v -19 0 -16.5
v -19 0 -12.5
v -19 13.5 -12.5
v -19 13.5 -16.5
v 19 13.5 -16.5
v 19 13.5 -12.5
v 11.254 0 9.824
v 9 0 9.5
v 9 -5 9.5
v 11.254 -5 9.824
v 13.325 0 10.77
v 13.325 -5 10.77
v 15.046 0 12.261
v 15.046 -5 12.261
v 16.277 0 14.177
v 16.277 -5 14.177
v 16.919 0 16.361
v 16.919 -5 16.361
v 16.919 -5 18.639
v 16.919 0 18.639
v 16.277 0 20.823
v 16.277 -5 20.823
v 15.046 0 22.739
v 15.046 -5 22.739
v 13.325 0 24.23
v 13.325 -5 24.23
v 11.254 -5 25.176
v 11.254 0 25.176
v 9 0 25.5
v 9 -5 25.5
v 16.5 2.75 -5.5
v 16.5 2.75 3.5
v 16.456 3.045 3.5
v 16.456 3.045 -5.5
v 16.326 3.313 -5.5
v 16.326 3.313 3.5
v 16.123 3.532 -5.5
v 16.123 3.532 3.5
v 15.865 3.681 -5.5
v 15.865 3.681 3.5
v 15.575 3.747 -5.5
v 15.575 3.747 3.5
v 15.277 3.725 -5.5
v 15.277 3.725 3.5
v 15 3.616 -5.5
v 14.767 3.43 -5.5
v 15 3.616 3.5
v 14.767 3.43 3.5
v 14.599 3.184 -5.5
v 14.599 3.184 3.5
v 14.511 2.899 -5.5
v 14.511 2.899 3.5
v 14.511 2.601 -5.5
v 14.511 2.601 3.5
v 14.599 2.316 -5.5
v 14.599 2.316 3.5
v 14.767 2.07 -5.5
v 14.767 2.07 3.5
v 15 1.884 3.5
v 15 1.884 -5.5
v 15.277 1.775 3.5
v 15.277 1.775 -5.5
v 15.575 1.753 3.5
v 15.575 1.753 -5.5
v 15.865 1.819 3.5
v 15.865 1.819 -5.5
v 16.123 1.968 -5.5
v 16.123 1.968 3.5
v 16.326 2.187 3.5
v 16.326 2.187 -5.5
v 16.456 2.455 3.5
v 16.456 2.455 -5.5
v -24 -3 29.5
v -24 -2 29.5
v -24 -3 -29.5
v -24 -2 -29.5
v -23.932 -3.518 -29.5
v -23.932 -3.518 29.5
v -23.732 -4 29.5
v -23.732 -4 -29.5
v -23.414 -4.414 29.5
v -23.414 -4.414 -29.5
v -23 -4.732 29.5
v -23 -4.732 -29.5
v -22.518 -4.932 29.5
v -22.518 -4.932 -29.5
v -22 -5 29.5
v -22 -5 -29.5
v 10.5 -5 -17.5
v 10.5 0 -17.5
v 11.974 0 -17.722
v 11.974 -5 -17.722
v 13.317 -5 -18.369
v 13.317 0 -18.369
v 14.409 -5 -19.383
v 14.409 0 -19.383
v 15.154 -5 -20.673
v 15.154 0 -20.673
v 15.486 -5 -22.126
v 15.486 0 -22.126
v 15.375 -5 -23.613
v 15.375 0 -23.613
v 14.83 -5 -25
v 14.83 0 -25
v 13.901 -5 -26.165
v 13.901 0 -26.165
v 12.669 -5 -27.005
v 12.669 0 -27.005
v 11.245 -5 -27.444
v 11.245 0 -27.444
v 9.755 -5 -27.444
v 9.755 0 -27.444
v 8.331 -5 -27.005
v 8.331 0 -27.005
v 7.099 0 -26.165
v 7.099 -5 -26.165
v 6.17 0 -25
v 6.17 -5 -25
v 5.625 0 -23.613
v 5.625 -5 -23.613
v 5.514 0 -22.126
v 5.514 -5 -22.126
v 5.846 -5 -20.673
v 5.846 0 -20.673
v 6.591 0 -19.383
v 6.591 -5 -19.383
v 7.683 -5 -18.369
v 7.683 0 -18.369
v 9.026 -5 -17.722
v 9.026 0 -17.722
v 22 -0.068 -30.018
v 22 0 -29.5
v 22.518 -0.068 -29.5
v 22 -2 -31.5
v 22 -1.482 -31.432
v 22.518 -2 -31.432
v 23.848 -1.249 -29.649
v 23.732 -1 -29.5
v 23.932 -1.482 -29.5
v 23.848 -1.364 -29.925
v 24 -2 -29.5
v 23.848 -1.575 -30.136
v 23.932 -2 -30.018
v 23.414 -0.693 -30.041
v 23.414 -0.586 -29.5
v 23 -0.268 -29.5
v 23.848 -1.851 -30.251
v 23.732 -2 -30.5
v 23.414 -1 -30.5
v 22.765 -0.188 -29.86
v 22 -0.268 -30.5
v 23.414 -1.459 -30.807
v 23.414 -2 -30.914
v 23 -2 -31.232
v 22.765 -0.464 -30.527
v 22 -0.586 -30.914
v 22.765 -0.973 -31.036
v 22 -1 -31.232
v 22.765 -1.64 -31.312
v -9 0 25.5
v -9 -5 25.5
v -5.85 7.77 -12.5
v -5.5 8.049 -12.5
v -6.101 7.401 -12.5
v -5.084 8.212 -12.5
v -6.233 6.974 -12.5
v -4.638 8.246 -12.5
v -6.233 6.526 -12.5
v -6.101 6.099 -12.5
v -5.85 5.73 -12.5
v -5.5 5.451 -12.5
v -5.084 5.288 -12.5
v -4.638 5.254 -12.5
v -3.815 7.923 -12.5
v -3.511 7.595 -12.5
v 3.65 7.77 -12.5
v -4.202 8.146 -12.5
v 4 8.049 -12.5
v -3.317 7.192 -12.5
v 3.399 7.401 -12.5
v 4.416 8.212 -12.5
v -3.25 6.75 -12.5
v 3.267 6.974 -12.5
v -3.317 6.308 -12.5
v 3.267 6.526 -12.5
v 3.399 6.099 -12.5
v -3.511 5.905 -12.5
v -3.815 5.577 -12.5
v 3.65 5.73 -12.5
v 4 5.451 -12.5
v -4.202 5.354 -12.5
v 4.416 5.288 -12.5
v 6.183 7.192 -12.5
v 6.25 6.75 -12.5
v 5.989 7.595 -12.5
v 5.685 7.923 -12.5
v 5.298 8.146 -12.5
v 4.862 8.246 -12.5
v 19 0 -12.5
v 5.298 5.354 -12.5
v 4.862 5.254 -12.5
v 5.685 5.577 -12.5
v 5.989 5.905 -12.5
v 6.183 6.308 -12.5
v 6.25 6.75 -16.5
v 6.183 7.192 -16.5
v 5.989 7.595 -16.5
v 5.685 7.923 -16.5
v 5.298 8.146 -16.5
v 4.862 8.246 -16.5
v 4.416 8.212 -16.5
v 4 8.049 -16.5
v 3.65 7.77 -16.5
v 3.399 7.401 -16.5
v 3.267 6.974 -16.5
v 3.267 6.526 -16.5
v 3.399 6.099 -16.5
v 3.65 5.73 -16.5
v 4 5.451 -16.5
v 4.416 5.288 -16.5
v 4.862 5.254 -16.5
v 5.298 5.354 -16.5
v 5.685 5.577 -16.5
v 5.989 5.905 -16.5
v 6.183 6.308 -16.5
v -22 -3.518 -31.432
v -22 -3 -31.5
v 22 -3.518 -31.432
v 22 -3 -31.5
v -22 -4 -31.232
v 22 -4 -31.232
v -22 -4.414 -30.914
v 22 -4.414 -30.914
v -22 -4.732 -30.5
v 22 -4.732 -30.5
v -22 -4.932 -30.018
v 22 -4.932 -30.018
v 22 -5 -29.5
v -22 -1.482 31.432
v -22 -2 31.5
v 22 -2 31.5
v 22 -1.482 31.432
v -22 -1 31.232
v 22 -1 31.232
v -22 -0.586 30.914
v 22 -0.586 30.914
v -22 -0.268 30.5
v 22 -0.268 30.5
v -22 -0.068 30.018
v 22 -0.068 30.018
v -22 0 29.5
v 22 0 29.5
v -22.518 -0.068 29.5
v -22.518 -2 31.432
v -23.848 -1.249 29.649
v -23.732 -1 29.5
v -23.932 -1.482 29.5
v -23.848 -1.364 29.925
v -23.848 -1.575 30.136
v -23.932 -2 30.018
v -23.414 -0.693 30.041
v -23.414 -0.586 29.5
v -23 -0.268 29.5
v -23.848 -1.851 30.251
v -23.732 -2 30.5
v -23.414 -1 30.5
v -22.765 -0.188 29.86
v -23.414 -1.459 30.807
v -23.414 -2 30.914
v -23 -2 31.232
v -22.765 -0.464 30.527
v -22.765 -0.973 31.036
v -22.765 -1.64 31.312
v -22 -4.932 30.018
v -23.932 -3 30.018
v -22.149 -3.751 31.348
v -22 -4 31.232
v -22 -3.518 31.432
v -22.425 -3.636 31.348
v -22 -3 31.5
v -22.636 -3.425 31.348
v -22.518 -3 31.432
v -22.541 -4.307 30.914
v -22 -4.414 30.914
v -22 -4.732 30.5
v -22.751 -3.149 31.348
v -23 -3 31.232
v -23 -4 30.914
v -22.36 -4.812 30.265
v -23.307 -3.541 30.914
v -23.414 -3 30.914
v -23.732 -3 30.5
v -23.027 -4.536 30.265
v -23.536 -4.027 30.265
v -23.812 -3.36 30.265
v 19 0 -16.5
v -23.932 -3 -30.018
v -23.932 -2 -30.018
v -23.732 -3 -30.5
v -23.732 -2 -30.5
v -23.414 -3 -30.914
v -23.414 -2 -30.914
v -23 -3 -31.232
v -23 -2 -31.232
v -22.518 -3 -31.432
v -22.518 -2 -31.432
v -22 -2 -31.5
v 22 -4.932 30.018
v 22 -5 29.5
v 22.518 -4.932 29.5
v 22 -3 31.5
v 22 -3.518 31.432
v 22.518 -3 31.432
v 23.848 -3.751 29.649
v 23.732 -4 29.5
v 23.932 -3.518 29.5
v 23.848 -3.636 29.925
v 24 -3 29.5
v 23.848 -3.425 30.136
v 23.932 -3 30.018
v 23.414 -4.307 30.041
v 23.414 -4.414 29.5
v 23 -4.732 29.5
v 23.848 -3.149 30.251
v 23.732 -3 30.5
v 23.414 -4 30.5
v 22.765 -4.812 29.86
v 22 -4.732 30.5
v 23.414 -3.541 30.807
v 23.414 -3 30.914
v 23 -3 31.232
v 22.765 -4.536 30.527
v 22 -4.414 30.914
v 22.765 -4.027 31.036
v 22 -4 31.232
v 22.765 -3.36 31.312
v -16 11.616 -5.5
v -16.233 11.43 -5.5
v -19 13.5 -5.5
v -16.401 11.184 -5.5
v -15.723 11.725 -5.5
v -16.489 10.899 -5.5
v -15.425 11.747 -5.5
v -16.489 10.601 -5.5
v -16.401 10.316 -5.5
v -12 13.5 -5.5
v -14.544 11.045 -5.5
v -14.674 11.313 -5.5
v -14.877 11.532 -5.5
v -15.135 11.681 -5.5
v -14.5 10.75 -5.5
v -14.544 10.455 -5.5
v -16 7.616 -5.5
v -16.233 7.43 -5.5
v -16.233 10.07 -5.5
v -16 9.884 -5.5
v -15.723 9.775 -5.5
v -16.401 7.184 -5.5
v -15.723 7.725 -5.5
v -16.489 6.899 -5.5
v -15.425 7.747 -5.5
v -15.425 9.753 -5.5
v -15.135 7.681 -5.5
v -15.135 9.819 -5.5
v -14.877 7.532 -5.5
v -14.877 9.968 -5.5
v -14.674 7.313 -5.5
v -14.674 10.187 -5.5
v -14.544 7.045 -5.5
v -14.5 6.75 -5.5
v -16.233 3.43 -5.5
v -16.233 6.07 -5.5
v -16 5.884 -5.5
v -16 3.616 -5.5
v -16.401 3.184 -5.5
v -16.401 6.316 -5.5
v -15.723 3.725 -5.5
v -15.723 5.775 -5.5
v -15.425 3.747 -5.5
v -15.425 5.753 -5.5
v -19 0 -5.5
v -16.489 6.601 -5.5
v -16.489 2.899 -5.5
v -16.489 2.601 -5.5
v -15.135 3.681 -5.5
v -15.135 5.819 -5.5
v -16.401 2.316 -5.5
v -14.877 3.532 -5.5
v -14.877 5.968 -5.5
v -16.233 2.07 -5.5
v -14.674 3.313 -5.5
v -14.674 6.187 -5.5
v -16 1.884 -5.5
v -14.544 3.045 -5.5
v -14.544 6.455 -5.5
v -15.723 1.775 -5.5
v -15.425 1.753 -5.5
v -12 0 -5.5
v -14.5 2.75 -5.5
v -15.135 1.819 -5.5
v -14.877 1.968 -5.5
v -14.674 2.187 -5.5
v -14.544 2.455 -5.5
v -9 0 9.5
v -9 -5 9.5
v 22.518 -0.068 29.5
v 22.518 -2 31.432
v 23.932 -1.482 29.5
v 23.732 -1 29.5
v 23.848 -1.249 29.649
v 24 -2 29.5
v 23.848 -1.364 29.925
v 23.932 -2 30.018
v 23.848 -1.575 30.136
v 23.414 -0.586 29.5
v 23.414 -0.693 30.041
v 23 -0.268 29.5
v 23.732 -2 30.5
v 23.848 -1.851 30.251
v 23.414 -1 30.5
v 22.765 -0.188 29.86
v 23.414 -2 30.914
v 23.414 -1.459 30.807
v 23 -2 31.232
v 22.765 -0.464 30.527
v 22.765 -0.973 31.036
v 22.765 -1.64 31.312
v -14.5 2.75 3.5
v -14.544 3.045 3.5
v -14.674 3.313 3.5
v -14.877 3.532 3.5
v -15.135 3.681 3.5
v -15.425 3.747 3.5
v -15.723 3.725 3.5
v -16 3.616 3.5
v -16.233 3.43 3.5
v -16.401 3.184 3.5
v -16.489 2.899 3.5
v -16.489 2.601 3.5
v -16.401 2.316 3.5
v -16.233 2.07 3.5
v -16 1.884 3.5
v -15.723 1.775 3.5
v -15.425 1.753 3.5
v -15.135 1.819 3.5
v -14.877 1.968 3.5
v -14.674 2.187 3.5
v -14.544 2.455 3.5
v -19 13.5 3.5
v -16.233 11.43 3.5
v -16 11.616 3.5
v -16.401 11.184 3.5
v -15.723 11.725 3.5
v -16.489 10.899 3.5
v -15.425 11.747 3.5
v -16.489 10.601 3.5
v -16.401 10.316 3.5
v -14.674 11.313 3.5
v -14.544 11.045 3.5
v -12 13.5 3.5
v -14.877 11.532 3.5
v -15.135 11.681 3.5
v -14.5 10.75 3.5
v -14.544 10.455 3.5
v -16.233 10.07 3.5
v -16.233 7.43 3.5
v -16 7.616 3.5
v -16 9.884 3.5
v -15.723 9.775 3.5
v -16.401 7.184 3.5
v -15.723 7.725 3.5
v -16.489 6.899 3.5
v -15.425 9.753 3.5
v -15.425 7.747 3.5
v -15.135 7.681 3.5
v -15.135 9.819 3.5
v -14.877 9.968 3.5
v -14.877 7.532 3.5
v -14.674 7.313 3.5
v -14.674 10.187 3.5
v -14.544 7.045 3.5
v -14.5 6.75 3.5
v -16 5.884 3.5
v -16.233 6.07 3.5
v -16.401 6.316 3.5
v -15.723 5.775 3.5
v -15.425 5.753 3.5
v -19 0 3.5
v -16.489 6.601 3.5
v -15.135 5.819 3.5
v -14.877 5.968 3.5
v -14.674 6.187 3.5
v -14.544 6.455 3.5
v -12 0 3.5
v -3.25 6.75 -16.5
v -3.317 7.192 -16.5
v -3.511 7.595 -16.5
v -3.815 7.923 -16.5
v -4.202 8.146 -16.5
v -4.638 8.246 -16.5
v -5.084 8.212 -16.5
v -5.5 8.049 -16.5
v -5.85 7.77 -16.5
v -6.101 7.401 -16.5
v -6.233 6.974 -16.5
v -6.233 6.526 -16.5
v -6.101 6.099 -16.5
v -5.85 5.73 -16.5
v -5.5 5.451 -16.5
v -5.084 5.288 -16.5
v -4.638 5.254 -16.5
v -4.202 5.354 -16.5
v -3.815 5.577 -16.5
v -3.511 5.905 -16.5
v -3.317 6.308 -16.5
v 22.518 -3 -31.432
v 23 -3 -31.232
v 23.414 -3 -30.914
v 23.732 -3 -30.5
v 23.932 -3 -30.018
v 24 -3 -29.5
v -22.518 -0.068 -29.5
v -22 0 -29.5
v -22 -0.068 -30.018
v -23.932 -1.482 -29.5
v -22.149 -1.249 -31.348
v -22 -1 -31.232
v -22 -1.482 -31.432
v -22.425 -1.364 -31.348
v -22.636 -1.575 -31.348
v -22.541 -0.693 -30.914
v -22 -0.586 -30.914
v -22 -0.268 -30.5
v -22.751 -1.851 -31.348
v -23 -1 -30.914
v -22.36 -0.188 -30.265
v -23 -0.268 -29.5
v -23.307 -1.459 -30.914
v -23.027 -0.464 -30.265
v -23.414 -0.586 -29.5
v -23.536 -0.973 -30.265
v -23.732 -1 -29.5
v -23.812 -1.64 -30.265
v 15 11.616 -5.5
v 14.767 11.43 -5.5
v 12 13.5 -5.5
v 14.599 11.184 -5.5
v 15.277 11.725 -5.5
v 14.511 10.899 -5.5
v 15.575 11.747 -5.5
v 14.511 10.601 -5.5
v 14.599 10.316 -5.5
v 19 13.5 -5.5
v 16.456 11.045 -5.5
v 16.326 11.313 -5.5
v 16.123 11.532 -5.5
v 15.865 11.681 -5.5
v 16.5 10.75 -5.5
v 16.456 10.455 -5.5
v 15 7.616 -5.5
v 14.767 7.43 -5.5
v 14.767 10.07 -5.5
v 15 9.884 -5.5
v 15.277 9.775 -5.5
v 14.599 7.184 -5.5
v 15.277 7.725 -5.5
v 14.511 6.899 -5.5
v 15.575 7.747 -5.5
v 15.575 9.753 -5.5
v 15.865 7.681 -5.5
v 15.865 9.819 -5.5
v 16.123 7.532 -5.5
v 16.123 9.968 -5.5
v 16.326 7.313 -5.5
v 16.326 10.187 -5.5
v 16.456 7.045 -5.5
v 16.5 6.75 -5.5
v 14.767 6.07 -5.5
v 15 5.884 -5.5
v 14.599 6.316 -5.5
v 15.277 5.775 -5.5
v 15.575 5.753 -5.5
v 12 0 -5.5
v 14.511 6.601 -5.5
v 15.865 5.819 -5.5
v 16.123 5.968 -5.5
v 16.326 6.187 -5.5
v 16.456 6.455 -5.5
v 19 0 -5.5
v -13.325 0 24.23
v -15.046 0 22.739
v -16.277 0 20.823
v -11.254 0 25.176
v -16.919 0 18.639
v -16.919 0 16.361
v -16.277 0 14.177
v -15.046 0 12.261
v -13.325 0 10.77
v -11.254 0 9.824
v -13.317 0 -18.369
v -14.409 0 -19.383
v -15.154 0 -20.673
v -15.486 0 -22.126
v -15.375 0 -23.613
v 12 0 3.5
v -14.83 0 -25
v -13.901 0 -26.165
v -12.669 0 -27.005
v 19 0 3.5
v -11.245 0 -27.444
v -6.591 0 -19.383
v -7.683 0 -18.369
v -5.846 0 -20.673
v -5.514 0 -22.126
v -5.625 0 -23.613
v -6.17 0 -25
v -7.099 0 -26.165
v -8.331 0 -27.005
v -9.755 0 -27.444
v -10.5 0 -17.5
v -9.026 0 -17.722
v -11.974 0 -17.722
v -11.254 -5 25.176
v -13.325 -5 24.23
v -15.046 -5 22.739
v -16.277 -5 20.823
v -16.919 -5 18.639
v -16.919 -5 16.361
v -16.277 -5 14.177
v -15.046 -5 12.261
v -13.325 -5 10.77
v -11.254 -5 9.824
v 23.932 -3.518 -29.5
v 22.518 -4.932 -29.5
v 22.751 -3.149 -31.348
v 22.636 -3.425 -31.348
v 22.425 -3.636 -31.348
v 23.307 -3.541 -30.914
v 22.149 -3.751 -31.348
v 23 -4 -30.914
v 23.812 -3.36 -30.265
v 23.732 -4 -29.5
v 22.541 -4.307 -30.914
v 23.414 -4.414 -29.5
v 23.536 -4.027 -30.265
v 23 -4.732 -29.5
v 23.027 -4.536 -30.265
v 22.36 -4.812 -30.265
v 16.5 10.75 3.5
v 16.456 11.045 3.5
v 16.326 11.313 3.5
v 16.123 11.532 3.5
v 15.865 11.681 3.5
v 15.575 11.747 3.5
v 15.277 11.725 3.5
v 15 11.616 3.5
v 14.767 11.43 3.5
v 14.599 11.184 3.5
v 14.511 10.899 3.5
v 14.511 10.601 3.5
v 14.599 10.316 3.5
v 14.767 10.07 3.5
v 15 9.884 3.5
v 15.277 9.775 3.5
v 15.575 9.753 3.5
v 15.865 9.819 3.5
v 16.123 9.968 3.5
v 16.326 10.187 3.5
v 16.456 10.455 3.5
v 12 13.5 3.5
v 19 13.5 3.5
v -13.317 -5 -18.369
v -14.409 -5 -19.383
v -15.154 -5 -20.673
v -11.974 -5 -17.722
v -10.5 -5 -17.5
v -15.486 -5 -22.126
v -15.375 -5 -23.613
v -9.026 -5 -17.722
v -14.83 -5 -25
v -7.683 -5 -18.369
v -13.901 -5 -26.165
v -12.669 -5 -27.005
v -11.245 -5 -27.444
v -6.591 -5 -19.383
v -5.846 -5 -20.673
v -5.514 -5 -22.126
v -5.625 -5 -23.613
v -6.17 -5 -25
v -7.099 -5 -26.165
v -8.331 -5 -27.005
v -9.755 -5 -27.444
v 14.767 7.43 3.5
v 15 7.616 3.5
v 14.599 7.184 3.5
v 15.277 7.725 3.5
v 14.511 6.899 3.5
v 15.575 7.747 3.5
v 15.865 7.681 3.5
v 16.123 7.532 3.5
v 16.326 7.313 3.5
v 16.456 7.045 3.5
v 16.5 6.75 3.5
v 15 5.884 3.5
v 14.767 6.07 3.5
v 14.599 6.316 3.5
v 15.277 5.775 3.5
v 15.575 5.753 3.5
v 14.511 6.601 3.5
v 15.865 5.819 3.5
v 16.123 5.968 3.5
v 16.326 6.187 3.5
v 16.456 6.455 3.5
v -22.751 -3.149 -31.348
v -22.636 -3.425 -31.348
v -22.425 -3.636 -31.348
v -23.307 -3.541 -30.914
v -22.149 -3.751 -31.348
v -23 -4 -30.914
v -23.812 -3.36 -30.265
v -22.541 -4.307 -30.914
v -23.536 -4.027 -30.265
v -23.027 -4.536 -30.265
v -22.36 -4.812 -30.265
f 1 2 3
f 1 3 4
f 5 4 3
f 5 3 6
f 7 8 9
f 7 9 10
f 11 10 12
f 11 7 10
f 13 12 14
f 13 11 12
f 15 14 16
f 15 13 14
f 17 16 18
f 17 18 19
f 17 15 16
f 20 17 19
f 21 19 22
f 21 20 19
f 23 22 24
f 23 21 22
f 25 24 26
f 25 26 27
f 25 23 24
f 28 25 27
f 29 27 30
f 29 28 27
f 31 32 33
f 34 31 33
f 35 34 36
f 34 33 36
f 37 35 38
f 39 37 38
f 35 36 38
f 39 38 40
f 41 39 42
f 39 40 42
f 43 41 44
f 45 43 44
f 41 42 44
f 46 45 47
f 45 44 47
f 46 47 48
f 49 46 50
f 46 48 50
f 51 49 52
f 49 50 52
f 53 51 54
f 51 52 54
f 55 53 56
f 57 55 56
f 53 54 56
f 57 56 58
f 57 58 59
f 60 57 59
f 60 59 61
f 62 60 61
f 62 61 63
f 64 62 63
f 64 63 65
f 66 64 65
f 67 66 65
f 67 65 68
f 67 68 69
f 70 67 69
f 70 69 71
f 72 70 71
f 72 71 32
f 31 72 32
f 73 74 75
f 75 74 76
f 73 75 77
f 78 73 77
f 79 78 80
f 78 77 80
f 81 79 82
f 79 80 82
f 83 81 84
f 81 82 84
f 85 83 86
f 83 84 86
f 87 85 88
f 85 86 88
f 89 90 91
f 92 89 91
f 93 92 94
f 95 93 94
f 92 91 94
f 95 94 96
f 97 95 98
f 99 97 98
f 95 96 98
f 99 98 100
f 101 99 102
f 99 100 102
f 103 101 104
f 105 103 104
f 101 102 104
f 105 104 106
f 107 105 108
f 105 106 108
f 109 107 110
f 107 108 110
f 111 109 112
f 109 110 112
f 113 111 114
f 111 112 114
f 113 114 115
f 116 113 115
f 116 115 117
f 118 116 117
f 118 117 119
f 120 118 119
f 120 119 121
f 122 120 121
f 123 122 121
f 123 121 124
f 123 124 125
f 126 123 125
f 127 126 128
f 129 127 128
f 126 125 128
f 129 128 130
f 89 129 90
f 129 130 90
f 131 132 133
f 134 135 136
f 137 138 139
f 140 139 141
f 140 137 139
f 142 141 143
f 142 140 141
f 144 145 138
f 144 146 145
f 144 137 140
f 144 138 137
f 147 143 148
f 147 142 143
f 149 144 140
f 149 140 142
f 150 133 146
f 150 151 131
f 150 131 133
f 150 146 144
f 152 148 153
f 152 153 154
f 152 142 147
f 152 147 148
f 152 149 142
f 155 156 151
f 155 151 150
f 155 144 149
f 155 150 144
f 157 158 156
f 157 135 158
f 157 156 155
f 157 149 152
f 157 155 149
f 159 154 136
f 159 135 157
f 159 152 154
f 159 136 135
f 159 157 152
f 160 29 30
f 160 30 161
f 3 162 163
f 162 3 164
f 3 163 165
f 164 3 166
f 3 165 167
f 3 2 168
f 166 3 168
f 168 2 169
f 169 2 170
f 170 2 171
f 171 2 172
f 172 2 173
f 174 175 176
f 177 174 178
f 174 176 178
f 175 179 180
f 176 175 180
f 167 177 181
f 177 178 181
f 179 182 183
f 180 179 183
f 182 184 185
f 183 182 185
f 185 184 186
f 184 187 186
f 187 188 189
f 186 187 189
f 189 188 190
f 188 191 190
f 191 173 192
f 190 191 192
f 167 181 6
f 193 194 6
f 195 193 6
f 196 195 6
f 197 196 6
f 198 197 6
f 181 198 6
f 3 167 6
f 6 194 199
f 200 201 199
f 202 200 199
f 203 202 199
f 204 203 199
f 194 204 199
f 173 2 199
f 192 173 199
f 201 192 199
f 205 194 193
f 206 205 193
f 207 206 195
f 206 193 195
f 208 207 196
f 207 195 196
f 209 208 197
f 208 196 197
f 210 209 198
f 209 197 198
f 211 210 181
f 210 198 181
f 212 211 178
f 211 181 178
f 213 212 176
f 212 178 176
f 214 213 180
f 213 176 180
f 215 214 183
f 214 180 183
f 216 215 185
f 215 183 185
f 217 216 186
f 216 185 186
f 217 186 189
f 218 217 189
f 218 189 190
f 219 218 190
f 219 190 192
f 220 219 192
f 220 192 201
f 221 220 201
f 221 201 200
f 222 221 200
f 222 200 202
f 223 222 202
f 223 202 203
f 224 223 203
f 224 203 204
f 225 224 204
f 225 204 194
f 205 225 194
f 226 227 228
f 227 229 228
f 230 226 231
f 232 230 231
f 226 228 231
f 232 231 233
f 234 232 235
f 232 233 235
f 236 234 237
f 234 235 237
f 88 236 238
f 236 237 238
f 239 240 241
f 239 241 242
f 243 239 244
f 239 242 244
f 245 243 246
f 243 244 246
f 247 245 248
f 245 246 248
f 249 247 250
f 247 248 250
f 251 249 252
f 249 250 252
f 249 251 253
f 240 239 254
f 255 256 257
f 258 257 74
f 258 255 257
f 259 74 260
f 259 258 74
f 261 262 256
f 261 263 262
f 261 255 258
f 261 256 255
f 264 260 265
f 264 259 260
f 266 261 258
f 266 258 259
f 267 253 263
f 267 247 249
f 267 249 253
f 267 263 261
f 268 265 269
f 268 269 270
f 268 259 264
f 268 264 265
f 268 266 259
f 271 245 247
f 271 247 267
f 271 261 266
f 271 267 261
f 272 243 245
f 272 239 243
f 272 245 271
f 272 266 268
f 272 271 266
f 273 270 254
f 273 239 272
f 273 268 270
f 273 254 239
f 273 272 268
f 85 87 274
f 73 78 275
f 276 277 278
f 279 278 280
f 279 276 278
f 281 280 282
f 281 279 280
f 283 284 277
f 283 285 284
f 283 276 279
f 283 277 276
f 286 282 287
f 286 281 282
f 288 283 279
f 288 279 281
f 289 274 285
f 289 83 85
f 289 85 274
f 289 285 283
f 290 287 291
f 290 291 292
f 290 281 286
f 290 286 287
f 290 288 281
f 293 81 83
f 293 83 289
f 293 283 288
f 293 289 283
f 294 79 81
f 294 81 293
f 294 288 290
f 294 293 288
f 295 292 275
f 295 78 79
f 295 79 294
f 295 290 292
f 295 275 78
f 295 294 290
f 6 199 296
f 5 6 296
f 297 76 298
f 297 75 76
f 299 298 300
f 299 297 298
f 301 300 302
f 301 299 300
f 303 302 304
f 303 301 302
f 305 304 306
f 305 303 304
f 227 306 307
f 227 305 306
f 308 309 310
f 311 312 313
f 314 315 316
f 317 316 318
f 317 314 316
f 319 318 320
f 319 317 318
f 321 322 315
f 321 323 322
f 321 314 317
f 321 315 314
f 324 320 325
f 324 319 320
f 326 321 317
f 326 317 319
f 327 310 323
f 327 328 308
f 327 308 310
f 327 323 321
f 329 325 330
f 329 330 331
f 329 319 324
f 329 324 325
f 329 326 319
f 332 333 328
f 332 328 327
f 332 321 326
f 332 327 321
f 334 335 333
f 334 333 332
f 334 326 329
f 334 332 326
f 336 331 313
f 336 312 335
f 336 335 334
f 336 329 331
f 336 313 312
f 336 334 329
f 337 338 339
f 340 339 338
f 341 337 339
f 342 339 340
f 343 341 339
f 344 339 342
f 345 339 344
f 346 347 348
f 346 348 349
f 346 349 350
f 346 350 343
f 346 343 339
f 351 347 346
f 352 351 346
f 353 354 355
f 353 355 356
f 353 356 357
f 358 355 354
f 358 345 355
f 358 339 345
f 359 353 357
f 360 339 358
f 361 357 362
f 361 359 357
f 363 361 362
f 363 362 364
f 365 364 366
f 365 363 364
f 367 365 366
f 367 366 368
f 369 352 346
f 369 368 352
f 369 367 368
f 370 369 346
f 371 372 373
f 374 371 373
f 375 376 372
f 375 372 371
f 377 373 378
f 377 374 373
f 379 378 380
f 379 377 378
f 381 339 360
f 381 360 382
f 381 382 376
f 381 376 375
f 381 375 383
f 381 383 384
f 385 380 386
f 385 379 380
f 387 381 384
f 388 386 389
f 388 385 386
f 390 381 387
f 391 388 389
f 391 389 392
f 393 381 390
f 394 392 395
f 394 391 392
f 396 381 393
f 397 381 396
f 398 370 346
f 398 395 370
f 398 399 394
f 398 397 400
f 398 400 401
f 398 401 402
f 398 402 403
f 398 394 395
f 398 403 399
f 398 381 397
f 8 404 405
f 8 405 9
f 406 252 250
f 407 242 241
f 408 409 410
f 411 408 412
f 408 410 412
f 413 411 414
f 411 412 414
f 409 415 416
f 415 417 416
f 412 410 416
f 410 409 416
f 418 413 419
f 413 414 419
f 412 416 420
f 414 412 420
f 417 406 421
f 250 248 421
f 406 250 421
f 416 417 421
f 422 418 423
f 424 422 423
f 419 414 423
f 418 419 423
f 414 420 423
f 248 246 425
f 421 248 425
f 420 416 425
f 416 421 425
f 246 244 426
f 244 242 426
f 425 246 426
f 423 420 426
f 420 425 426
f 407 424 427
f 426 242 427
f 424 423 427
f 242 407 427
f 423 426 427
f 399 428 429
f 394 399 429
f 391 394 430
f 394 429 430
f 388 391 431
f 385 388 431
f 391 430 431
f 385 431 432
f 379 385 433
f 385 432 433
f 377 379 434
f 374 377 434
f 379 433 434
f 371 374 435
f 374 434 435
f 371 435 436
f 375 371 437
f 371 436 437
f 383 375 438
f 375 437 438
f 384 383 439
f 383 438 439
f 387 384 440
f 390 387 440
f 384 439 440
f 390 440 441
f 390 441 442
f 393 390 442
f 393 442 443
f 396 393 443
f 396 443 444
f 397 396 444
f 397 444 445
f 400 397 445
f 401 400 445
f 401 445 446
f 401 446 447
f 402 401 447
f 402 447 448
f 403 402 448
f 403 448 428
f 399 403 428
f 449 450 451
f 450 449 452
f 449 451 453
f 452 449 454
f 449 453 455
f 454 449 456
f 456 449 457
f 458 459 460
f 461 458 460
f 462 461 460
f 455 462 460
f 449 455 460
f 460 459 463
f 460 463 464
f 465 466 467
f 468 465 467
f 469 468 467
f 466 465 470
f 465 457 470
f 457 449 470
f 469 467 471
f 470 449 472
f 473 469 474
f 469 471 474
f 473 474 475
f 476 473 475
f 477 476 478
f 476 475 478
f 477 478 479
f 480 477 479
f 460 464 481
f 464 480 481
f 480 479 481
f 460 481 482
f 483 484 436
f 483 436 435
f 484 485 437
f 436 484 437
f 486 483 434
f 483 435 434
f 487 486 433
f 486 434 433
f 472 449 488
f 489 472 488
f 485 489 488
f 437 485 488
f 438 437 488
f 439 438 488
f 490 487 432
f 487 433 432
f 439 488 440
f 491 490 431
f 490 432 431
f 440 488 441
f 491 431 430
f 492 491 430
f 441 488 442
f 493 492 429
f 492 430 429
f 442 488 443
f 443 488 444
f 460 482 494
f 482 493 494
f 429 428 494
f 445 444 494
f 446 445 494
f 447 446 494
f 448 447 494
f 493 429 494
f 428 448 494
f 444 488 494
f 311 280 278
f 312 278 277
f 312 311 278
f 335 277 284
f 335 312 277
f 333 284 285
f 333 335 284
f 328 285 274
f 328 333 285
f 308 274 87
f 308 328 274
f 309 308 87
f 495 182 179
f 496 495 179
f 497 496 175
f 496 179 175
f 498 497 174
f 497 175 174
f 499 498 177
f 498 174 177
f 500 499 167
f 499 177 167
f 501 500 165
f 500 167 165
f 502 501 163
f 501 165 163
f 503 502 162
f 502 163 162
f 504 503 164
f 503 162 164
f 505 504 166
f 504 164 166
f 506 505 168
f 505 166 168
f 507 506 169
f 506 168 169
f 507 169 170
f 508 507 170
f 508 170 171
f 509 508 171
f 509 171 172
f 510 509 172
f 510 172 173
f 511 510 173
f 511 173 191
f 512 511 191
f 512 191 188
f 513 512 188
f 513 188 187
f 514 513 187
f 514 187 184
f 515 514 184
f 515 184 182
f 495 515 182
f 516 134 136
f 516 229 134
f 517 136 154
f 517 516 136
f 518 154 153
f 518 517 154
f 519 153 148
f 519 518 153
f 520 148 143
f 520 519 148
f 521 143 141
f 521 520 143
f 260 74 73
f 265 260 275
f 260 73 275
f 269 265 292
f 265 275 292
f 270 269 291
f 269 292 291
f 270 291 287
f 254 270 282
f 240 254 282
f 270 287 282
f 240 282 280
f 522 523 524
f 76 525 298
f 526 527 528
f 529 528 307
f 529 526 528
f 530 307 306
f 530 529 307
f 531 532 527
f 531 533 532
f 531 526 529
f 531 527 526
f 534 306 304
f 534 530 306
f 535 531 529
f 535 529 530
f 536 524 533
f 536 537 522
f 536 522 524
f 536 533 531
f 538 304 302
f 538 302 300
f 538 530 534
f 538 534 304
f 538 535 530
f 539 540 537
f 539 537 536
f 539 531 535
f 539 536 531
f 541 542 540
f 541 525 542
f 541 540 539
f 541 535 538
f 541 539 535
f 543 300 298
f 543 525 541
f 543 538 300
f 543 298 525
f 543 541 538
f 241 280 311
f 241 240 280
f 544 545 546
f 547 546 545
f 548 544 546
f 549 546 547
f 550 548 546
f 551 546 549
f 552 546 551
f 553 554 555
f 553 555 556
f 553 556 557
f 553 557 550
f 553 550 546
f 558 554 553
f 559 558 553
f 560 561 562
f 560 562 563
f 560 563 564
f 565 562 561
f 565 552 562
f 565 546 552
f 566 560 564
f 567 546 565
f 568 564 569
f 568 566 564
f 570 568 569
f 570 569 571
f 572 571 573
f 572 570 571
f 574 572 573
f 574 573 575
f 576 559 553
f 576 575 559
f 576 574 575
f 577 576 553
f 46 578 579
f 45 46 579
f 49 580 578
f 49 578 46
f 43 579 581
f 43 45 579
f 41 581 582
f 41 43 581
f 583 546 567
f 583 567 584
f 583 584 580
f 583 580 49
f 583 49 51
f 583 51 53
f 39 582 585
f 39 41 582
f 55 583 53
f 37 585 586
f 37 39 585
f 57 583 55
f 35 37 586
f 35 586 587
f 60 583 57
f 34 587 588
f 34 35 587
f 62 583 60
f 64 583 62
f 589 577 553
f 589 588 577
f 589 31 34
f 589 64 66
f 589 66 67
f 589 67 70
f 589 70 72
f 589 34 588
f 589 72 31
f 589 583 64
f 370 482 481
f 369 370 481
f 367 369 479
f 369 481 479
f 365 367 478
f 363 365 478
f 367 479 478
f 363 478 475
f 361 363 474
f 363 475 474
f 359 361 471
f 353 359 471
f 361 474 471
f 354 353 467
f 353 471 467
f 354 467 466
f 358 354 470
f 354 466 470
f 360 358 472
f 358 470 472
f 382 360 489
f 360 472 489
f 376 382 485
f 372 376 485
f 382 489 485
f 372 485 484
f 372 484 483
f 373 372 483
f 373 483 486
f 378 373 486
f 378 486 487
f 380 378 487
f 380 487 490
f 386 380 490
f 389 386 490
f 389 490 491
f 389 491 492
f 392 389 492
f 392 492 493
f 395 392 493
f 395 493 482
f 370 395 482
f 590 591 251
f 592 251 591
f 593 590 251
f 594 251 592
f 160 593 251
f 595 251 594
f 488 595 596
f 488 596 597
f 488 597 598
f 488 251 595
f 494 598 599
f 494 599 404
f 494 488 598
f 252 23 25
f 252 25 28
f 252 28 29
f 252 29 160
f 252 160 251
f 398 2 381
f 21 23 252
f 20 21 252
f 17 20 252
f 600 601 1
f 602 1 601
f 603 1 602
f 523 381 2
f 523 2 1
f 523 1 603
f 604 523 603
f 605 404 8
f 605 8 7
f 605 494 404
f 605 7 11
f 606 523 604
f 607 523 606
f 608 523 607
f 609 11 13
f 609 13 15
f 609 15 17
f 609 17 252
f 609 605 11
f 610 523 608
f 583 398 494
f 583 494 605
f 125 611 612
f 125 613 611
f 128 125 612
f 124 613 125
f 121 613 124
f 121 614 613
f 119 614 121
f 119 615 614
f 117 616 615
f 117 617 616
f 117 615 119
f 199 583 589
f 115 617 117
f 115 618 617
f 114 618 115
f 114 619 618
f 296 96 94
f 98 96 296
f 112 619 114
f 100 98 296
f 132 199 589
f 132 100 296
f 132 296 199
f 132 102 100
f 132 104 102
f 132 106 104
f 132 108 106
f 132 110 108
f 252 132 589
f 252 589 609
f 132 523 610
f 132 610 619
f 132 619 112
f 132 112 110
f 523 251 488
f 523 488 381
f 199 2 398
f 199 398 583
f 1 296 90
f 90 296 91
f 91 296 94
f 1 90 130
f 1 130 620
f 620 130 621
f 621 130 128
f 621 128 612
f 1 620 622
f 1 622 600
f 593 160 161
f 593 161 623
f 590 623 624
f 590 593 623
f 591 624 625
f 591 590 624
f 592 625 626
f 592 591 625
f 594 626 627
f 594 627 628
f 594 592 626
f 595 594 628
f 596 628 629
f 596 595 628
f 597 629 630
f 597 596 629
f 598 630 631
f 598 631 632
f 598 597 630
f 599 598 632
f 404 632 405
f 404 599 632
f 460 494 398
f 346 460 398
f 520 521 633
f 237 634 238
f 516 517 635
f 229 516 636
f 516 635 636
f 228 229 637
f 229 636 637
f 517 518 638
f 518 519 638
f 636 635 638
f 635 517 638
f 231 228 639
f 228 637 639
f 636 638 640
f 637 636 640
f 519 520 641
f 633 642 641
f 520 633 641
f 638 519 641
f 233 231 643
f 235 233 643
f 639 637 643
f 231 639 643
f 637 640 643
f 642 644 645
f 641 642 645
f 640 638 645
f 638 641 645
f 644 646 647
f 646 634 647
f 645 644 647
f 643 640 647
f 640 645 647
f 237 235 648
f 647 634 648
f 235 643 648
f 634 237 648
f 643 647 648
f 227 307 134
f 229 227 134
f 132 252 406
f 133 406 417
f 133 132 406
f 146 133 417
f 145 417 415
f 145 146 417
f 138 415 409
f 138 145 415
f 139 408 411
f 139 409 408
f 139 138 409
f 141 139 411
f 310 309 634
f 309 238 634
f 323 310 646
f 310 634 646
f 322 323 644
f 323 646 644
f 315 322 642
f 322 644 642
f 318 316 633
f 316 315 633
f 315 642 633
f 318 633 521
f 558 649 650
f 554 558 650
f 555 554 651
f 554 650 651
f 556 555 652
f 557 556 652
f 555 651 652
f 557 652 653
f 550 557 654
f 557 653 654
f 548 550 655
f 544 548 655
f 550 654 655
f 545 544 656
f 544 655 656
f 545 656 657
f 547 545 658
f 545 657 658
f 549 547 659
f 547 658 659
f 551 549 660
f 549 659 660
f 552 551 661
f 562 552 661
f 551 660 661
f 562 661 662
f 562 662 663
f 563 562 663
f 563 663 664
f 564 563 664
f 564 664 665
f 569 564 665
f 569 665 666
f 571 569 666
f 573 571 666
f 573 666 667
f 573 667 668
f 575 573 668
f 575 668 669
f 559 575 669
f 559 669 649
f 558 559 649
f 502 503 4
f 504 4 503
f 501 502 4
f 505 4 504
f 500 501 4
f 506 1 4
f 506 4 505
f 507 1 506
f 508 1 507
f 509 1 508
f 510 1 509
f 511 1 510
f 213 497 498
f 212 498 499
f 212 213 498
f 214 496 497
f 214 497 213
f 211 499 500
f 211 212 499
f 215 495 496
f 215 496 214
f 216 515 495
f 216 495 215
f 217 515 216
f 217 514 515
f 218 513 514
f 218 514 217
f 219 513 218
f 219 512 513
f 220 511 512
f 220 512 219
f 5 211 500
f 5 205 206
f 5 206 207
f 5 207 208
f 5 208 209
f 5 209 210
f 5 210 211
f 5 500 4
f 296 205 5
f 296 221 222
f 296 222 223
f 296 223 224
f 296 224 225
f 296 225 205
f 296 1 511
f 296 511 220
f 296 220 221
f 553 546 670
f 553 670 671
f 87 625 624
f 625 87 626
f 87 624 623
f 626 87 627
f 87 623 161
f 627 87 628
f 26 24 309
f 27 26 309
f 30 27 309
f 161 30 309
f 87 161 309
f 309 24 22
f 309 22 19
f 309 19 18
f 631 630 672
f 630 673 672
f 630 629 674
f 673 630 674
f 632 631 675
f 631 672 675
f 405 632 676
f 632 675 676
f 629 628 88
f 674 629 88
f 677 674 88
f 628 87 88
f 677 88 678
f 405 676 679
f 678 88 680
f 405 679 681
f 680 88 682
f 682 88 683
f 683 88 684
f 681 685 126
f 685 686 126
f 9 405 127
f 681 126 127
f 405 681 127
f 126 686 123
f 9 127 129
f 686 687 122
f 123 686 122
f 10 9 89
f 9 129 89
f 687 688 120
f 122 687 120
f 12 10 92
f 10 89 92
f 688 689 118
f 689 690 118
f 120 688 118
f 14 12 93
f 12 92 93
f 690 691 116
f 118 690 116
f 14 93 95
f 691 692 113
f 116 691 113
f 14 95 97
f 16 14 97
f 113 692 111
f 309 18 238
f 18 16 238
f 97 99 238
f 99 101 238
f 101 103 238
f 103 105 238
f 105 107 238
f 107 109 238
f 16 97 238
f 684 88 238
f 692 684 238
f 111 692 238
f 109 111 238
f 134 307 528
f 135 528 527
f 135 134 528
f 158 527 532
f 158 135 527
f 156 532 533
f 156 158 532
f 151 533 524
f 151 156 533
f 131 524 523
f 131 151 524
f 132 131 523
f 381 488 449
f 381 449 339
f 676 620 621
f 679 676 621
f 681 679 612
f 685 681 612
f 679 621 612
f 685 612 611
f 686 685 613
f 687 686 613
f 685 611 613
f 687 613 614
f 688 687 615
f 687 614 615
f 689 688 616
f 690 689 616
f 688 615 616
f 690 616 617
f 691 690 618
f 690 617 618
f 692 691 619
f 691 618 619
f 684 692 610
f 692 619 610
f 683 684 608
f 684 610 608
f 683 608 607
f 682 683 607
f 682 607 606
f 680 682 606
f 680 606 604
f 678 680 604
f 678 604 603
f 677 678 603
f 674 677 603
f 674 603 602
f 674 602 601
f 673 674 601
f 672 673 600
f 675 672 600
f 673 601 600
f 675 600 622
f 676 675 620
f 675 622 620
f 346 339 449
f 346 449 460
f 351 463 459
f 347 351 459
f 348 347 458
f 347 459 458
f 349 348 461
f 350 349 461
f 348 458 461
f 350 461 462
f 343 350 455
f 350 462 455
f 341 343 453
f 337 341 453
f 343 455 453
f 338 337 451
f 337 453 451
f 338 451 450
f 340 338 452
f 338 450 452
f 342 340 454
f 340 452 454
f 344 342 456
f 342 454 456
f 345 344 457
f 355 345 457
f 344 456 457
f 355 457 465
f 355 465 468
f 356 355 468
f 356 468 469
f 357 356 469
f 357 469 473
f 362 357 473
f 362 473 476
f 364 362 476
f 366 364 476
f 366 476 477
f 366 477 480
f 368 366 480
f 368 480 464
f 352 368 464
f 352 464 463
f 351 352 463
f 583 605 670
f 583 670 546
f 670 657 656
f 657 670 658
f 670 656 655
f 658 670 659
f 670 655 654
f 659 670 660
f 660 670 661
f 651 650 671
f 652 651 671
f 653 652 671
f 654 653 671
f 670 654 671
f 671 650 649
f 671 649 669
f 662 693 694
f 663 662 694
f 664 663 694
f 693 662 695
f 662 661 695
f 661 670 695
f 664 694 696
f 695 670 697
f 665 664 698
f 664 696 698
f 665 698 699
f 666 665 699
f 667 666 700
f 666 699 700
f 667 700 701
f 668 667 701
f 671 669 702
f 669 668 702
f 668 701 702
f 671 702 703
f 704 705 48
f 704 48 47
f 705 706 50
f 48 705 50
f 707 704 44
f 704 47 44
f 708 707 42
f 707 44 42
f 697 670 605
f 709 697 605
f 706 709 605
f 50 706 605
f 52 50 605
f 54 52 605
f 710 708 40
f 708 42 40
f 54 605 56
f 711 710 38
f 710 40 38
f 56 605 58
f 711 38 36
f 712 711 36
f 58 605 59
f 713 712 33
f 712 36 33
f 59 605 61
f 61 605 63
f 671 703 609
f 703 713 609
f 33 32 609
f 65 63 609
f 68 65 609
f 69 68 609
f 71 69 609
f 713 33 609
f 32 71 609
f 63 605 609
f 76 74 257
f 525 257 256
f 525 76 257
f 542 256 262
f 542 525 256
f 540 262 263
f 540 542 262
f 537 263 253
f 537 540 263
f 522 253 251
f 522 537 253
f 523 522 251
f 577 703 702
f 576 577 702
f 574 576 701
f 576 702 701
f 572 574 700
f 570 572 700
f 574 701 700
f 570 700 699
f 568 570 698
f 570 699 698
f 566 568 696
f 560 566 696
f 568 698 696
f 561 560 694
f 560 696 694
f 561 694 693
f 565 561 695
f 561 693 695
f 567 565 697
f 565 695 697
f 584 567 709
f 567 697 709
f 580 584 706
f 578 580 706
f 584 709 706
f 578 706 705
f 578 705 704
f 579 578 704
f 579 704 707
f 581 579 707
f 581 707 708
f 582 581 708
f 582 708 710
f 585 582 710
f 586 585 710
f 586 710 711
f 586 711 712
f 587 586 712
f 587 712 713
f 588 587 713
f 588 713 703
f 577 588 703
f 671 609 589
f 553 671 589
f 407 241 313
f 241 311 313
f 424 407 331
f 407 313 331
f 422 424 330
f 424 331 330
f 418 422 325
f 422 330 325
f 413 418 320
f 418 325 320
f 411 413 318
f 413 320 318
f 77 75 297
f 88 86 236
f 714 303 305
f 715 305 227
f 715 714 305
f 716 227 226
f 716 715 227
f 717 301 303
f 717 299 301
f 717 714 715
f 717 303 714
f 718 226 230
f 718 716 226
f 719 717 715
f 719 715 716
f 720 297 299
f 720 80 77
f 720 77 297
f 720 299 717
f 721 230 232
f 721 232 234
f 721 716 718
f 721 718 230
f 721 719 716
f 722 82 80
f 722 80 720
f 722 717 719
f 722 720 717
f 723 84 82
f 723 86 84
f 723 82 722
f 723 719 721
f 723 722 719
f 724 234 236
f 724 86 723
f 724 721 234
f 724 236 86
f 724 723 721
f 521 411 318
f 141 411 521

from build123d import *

# Parameters (mm, degrees)
CROQUIS1_W              = 48
CROQUIS1_H              = 63
CROQUIS1_R              = 5
SALIENTE_EXTRUIR1_DEPTH = 5
CROQUIS2_W              = 7
CROQUIS2_H              = 9
CROQUIS2_W_2            = 38
CROQUIS2_H_2            = 4
SALIENTE_EXTRUIR2_DEPTH = 13.5
CORTAR_EXTRUIR1_REACH   = 53.906
CROQUIS3_R              = 1.5
CORTAR_EXTRUIR2_REACH   = 46.534
CROQUIS4_R              = 1
REDONDEO1_R             = 2


with BuildPart() as part:
    # Croquis1 → Saliente-Extruir1 (new body)
    with BuildSketch(Plane(origin=(0, 0, 0), x_dir=(1, 0, 0), z_dir=(0, 1, 0))):
        Rectangle(CROQUIS1_W, CROQUIS1_H)
        with Locations(Location((-10.5, 22.5, 0), (0, 0, 270))):
            Circle(CROQUIS1_R, mode=Mode.SUBTRACT)
        with Locations(Location((10.5, 22.5, 0), (0, 0, 270))):
            Circle(CROQUIS1_R, mode=Mode.SUBTRACT)
        with BuildLine():
            Line((-9, -9.5), (9, -9.5))
            ThreePointArc((9, -9.5), (17, -17.5), (9, -25.5))
            Line((9, -25.5), (-9, -25.5))
            ThreePointArc((-9, -25.5), (-17, -17.5), (-9, -9.5))
        make_face(mode=Mode.SUBTRACT)
    extrude(amount=-SALIENTE_EXTRUIR1_DEPTH)

    # Croquis2 → Saliente-Extruir2 (add)
    with BuildSketch(Plane(origin=(0, 0, 0), x_dir=(1, 0, 0), z_dir=(0, 1, 0))):
        with Locations((15.5, 1)):
            Rectangle(CROQUIS2_W, CROQUIS2_H)
        with Locations((-15.5, 1)):
            Rectangle(CROQUIS2_W, CROQUIS2_H)
        with Locations((0, 14.5)):
            Rectangle(CROQUIS2_W_2, CROQUIS2_H_2)
    extrude(amount=SALIENTE_EXTRUIR2_DEPTH)

    # Croquis3 → Cortar-Extruir1 (cut, up to next)
    with BuildSketch(Plane.XY.offset(-12.5), mode=Mode.PRIVATE) as cortar_extruir1_sk1:
        with Locations((4.75, 6.75)):
            Circle(CROQUIS3_R)
    cortar_extruir1_tool1 = extrude(cortar_extruir1_sk1.sketch, amount=-CORTAR_EXTRUIR1_REACH, mode=Mode.PRIVATE) & part.part
    # Croquis3 → Cortar-Extruir1 (cut, up to next)
    with BuildSketch(Plane.XY.offset(-12.5), mode=Mode.PRIVATE) as cortar_extruir1_sk2:
        with Locations((-4.75, 6.75)):
            Circle(CROQUIS3_R)
    cortar_extruir1_tool2 = extrude(cortar_extruir1_sk2.sketch, amount=-CORTAR_EXTRUIR1_REACH, mode=Mode.PRIVATE) & part.part
    add(cortar_extruir1_tool1.solids().sort_by_distance((4.75, 6.75, -12.5))[0], mode=Mode.SUBTRACT)
    add(cortar_extruir1_tool2.solids().sort_by_distance((-4.75, 6.75, -12.5))[0], mode=Mode.SUBTRACT)

    # Croquis4 → Cortar-Extruir2 (cut, up to next)
    with BuildSketch(Plane.XY.offset(3.5), mode=Mode.PRIVATE) as cortar_extruir2_sk1:
        with Locations((15.5, 6.75)):
            Circle(CROQUIS4_R)
    cortar_extruir2_tool1 = extrude(cortar_extruir2_sk1.sketch, amount=-CORTAR_EXTRUIR2_REACH, mode=Mode.PRIVATE) & part.part
    # Croquis4 → Cortar-Extruir2 (cut, up to next)
    with BuildSketch(Plane.XY.offset(3.5), mode=Mode.PRIVATE) as cortar_extruir2_sk2:
        with Locations((15.5, 2.75)):
            Circle(CROQUIS4_R)
    cortar_extruir2_tool2 = extrude(cortar_extruir2_sk2.sketch, amount=-CORTAR_EXTRUIR2_REACH, mode=Mode.PRIVATE) & part.part
    # Croquis4 → Cortar-Extruir2 (cut, up to next)
    with BuildSketch(Plane.XY.offset(3.5), mode=Mode.PRIVATE) as cortar_extruir2_sk3:
        with Locations((15.5, 10.75)):
            Circle(CROQUIS4_R)
    cortar_extruir2_tool3 = extrude(cortar_extruir2_sk3.sketch, amount=-CORTAR_EXTRUIR2_REACH, mode=Mode.PRIVATE) & part.part
    # Croquis4 → Cortar-Extruir2 (cut, up to next)
    with BuildSketch(Plane.XY.offset(3.5), mode=Mode.PRIVATE) as cortar_extruir2_sk4:
        with Locations((-15.5, 2.75)):
            Circle(CROQUIS4_R)
    cortar_extruir2_tool4 = extrude(cortar_extruir2_sk4.sketch, amount=-CORTAR_EXTRUIR2_REACH, mode=Mode.PRIVATE) & part.part
    # Croquis4 → Cortar-Extruir2 (cut, up to next)
    with BuildSketch(Plane.XY.offset(3.5), mode=Mode.PRIVATE) as cortar_extruir2_sk5:
        with Locations((-15.5, 6.75)):
            Circle(CROQUIS4_R)
    cortar_extruir2_tool5 = extrude(cortar_extruir2_sk5.sketch, amount=-CORTAR_EXTRUIR2_REACH, mode=Mode.PRIVATE) & part.part
    # Croquis4 → Cortar-Extruir2 (cut, up to next)
    with BuildSketch(Plane.XY.offset(3.5), mode=Mode.PRIVATE) as cortar_extruir2_sk6:
        with Locations((-15.5, 10.75)):
            Circle(CROQUIS4_R)
    cortar_extruir2_tool6 = extrude(cortar_extruir2_sk6.sketch, amount=-CORTAR_EXTRUIR2_REACH, mode=Mode.PRIVATE) & part.part
    add(cortar_extruir2_tool1.solids().sort_by_distance((15.5, 6.75, 3.5))[0], mode=Mode.SUBTRACT)
    add(cortar_extruir2_tool2.solids().sort_by_distance((15.5, 2.75, 3.5))[0], mode=Mode.SUBTRACT)
    add(cortar_extruir2_tool3.solids().sort_by_distance((15.5, 10.75, 3.5))[0], mode=Mode.SUBTRACT)
    add(cortar_extruir2_tool4.solids().sort_by_distance((-15.5, 2.75, 3.5))[0], mode=Mode.SUBTRACT)
    add(cortar_extruir2_tool5.solids().sort_by_distance((-15.5, 6.75, 3.5))[0], mode=Mode.SUBTRACT)
    add(cortar_extruir2_tool6.solids().sort_by_distance((-15.5, 10.75, 3.5))[0], mode=Mode.SUBTRACT)

    # Redondeo1
    redondeo1_edges = [part.edges().sort_by_distance(p)[0] for p in [
        (-24, -5, 0),
        (0, -5, 31.5),
        (24, -5, 0),
        (0, 0, 31.5),
        (-24, 0, 0),
        (0, 0, -31.5),
        (24, 0, 0),
        (24, -2.5, 31.5),
        (-24, -2.5, 31.5),
        (-24, -2.5, -31.5),
        (24, -2.5, -31.5),
        (0, -5, -31.5),
    ]]
    fillet(redondeo1_edges, radius=REDONDEO1_R)


solid = part.part
